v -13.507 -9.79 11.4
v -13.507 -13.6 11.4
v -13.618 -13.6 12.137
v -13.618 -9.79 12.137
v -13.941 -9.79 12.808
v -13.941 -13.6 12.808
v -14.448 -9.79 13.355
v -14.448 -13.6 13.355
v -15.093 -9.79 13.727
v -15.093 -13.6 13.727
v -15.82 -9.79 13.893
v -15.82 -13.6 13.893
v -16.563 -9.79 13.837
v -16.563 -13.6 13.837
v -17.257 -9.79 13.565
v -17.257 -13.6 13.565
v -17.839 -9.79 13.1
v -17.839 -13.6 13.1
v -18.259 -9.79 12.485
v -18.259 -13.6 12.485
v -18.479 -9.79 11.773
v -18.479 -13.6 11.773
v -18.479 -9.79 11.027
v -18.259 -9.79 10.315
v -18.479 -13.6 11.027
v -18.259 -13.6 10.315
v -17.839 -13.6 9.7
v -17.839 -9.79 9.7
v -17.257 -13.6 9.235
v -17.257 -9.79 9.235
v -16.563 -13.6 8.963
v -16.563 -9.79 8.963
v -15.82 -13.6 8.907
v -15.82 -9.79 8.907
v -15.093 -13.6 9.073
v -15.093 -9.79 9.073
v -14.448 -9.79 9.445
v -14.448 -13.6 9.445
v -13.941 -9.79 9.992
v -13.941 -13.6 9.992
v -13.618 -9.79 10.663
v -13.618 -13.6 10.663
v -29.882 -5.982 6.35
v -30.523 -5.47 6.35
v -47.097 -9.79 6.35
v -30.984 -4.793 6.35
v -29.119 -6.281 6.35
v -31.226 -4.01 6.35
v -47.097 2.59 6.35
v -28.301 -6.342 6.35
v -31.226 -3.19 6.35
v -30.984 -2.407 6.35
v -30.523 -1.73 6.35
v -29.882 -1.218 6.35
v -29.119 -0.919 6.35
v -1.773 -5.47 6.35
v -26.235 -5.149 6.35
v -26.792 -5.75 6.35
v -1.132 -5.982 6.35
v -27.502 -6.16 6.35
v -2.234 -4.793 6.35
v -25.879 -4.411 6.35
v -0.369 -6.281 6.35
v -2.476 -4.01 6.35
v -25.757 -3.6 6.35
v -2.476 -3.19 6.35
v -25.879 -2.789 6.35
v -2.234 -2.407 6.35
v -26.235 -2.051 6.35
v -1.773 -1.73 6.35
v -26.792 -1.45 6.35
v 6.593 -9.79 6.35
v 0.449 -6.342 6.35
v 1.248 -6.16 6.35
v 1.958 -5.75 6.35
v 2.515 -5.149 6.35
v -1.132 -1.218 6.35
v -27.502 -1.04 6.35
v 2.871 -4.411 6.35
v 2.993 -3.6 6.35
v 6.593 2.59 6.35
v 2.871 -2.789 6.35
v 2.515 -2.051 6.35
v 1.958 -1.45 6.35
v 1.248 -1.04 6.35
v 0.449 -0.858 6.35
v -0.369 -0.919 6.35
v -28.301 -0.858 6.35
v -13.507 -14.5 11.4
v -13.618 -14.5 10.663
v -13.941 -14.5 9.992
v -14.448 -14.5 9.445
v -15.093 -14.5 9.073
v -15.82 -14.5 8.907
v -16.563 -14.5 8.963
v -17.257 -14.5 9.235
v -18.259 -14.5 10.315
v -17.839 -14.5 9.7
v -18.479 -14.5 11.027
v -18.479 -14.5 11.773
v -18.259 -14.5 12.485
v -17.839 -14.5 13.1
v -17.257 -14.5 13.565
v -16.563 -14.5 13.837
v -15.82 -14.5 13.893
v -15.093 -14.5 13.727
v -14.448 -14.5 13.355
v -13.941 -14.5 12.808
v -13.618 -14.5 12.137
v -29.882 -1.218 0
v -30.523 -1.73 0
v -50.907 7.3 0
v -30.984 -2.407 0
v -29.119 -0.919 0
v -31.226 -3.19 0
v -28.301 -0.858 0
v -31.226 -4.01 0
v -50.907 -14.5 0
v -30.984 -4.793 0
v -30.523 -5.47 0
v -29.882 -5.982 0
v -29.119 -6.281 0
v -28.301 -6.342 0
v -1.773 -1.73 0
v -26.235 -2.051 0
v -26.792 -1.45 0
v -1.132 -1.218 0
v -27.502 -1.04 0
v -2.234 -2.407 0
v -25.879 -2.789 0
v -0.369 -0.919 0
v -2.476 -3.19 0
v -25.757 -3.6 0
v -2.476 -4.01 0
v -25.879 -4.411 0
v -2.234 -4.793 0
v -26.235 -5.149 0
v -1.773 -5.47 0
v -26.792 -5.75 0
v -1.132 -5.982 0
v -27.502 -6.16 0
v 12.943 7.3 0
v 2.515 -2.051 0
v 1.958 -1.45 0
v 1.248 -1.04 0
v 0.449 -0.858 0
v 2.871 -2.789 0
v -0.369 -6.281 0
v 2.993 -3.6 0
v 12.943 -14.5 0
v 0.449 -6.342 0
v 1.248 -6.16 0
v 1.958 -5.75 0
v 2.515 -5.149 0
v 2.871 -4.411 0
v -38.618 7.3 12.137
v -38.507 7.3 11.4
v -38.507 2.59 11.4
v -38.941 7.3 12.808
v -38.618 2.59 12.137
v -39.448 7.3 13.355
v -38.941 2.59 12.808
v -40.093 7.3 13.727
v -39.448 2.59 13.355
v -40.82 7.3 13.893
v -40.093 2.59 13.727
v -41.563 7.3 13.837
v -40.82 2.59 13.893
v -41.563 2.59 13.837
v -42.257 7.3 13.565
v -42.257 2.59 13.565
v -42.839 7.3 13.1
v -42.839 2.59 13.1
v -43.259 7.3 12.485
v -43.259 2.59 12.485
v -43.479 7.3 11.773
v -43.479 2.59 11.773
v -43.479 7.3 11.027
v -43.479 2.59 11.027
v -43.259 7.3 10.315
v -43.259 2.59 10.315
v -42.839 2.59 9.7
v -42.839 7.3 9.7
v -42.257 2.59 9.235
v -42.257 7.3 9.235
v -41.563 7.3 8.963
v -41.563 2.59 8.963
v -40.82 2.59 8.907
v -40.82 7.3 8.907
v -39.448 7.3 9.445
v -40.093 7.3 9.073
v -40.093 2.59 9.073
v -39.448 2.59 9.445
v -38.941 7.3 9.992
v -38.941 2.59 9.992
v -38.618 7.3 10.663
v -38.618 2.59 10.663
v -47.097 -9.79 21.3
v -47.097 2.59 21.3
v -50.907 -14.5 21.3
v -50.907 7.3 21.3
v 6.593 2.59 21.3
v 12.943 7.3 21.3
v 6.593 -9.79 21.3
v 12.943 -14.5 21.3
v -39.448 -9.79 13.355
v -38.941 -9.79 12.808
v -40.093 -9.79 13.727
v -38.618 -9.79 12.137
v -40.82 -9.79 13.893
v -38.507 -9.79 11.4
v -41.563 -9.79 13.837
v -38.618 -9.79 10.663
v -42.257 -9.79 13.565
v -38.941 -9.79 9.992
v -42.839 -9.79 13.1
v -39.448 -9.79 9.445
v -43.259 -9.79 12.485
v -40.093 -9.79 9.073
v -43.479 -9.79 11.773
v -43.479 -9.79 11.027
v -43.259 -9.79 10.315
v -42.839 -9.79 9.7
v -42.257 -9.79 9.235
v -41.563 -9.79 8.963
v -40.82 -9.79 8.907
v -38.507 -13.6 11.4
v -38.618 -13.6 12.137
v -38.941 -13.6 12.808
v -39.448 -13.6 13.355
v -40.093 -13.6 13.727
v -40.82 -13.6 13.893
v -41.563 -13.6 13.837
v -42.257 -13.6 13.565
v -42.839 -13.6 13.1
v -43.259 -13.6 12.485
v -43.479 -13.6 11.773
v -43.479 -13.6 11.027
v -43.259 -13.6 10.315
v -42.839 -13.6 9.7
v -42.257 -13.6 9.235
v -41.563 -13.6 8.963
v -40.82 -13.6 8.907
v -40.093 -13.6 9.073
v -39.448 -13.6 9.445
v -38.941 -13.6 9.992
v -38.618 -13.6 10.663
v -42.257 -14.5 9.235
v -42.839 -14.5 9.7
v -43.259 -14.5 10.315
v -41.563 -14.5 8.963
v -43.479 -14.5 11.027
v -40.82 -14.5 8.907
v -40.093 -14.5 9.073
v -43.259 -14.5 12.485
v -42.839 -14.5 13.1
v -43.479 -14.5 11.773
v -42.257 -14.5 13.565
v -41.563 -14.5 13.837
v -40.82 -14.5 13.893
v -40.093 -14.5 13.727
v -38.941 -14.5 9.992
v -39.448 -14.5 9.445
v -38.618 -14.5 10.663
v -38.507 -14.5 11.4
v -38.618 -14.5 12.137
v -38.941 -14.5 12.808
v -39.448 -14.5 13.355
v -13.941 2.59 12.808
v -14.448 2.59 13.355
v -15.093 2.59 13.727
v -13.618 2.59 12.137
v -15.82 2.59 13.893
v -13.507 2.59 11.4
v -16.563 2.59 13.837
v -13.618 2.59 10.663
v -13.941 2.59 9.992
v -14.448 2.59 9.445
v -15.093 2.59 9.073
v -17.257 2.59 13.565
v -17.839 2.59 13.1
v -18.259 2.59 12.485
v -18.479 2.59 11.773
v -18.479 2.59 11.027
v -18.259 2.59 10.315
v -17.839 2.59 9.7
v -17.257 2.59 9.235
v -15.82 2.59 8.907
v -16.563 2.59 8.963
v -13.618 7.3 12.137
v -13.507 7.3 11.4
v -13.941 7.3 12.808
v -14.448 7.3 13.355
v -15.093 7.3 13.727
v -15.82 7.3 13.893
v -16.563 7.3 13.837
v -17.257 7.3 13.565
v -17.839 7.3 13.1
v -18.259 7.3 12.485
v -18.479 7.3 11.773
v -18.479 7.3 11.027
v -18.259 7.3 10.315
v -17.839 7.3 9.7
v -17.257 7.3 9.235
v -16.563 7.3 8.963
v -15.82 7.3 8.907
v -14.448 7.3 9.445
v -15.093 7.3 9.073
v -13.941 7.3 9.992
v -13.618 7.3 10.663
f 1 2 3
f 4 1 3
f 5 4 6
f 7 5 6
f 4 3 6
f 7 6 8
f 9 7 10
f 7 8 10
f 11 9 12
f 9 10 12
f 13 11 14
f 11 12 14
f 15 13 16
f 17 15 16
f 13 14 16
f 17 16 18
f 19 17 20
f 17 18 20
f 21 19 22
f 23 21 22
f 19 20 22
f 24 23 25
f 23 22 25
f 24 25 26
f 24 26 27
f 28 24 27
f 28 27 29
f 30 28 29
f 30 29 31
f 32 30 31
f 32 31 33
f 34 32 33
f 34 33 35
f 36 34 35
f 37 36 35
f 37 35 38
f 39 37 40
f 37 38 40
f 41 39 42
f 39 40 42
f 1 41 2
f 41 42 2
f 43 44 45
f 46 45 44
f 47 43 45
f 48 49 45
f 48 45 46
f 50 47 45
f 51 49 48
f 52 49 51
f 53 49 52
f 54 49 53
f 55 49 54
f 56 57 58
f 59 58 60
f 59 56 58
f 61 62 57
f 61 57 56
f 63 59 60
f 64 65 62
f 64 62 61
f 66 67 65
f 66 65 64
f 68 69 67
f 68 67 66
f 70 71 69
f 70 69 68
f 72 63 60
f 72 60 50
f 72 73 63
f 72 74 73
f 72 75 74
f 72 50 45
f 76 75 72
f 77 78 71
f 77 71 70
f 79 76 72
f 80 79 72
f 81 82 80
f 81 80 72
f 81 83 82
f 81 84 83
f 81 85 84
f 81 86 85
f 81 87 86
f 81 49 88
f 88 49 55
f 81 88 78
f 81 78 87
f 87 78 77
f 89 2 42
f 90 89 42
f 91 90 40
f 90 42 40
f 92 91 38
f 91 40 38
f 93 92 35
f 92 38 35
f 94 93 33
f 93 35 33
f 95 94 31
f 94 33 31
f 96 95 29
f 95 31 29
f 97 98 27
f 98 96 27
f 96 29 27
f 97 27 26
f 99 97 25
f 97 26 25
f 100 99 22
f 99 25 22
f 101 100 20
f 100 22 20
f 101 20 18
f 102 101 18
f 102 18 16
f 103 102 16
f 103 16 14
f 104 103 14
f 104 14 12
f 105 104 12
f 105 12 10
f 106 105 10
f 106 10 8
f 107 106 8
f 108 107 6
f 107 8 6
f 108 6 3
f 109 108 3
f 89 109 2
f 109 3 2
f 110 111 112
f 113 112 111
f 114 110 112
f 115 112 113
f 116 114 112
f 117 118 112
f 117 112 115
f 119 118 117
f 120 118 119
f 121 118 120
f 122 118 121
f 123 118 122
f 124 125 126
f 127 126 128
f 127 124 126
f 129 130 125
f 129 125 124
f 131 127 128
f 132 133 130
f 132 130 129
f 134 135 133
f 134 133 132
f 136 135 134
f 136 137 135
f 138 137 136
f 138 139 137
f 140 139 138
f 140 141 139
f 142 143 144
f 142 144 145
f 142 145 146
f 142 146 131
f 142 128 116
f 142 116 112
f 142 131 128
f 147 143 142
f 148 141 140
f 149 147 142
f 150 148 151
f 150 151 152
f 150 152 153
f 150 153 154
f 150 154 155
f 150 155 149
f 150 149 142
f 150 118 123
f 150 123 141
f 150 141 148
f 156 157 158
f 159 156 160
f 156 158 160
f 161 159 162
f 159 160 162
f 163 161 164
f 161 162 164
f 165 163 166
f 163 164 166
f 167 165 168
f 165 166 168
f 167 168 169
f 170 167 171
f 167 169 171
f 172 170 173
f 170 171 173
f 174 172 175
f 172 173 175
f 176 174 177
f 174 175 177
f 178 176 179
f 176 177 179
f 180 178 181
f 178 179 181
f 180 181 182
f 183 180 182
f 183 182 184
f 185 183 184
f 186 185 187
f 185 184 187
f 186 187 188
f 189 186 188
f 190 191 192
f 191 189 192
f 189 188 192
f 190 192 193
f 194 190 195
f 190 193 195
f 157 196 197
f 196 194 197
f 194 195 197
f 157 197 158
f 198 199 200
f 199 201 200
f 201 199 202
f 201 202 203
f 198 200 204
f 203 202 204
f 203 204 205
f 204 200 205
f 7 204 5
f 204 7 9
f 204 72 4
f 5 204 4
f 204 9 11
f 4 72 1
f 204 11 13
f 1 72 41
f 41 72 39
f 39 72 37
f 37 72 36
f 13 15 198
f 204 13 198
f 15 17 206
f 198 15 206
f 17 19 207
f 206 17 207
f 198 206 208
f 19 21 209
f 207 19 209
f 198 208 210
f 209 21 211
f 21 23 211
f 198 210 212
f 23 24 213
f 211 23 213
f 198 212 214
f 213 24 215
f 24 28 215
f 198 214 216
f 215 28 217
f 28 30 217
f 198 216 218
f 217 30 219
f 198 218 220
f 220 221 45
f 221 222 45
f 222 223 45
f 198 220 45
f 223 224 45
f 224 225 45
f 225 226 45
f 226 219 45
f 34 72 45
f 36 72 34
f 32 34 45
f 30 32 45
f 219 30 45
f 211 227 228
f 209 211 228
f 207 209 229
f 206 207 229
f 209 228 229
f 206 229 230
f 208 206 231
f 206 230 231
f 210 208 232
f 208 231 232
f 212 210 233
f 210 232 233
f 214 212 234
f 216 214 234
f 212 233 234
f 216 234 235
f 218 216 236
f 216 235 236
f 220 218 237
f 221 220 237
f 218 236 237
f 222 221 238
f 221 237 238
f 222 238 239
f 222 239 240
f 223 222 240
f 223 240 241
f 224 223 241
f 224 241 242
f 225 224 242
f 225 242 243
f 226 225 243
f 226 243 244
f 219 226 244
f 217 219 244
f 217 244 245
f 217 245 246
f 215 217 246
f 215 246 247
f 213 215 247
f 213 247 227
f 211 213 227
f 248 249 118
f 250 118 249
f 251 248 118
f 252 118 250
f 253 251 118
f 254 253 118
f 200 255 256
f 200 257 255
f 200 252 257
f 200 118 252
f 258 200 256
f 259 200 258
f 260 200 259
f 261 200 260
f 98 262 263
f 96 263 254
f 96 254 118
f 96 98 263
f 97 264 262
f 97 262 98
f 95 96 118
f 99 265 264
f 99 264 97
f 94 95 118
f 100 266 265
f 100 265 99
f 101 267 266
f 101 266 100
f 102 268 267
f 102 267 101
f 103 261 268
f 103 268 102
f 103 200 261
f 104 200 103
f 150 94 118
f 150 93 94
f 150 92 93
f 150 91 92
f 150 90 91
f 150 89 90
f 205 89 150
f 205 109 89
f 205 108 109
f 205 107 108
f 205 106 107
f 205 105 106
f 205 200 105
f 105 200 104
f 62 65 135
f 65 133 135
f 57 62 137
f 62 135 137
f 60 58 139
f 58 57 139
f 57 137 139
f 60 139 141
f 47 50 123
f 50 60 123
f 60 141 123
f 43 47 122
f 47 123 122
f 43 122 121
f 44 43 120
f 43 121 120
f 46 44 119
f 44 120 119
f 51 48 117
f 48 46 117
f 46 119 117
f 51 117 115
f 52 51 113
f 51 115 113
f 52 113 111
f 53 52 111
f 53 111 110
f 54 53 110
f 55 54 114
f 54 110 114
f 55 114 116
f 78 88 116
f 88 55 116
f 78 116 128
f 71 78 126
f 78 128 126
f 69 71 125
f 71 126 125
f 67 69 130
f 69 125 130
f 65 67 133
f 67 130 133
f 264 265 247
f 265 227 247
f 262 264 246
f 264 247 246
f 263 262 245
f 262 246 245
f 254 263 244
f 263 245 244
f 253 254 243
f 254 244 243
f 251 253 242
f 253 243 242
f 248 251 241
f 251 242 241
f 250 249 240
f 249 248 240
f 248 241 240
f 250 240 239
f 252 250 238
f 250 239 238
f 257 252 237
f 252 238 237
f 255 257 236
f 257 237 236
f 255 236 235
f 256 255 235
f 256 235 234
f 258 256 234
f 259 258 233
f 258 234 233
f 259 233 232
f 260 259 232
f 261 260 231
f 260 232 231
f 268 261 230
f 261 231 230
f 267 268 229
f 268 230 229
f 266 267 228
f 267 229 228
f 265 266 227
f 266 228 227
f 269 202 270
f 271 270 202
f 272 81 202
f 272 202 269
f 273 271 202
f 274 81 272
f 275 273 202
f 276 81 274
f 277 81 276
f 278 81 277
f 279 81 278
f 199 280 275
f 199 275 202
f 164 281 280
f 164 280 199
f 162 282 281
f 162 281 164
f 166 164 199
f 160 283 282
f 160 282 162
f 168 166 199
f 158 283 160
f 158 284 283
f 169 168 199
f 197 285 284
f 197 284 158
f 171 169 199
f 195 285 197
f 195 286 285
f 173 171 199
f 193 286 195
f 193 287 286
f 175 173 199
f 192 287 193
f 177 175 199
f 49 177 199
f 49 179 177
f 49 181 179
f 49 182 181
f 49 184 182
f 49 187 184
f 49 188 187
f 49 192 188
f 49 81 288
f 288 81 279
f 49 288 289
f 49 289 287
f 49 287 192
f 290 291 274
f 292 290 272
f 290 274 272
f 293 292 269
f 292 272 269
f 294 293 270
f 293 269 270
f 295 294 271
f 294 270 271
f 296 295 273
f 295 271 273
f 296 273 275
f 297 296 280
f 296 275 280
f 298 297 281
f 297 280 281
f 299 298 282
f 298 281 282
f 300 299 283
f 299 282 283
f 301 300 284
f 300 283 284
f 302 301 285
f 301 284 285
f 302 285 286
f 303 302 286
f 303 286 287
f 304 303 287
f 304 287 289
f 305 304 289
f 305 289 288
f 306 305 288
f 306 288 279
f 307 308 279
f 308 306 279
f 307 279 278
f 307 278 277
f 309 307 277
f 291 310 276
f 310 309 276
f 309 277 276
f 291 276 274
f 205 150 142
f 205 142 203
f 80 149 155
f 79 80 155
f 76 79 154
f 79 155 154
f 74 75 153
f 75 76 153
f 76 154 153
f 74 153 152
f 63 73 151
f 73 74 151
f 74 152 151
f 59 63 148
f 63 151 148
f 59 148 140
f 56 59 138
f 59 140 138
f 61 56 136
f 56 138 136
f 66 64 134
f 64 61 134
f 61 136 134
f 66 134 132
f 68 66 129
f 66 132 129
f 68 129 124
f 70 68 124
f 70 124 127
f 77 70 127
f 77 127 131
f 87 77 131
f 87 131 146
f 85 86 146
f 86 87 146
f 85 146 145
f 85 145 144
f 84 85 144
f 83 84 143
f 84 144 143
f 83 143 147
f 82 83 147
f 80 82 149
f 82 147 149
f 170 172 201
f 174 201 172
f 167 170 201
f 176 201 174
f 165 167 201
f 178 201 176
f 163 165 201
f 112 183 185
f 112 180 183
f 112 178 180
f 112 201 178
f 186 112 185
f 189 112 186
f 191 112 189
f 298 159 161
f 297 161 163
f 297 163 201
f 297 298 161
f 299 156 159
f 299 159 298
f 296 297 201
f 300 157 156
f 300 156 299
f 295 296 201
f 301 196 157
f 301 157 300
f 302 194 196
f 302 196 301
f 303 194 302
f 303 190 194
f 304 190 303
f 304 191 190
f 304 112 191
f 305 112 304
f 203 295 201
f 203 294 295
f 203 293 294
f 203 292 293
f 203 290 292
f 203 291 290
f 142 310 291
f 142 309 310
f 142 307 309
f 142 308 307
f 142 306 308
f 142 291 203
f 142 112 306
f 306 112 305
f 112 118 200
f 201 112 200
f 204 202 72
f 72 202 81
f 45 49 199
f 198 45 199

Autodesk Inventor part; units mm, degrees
ref_plane "YZ Plane" through (0, 0, 0) normal (1, 0, 0) x (0, 1, 0)
ref_plane "XZ Plane" through (0, 0, 0) normal (0, 1, 0) x (-1, 0, 0)
sketch "Sketch1" plane through (0, 0, 0) normal (0, 0, 1) x (1, 0, 0)
  line L0 (0, -12.35) -> (-250, -12.35) projected
  line L1 (0, -12.35) -> (0, -7.2) projected
  line L2 (0, -7.2) -> (-250, -7.2) projected
  line L3 (-250, -12.35) -> (-250, -7.2) projected
  line L4 (-250, 5.15) -> (0, 5.15) projected
  line L5 (-250, 0) -> (-250, 5.15) projected
  line L6 (0, 0) -> (-250, 0) projected
  line L7 (0, 0) -> (0, 5.15) projected
  line L8 (0, 6.4) -> (-250, 6.4) projected
  line L9 (-250, -13.6) -> (0, -13.6) projected
  line L10 (-159.051, -15.85) -> (90.949, -15.85) projected
  line L11 (-159.051, -21) -> (-159.051, -15.85) projected
  line L12 (90.949, -21) -> (-159.051, -21) projected
  line L13 (90.949, -21) -> (90.949, -15.85) projected
  line L14 (90.949, 8.65) -> (-159.051, 8.65) projected
  line L15 (90.949, 13.8) -> (90.949, 8.65) projected
  line L16 (-159.051, 13.8) -> (90.949, 13.8) projected
  line L17 (-159.051, 13.8) -> (-159.051, 8.65) projected
  line L18 (-159.051, 7.4) -> (90.949, 7.4) projected
  line L19 (90.949, -14.6) -> (-159.051, -14.6) projected
  line L20 (-159.051, -34.6) -> (90.949, -34.6) projected
  line L21 (90.949, 27.4) -> (-159.051, 27.4) projected
  line L22 (-50.9068, -42.05) -> (-6.1068, -42.05) projected
  line L23 (-6.1068, -42.05) -> (-6.1068, -35.7) projected
  line L24 (-50.9068, -35.7) -> (-6.1068, -35.7) projected
  line L25 (-50.9068, -42.05) -> (-50.9068, -35.7) projected
  line L26 (-50.9068, 28.5) -> (-6.1068, 28.5) projected
  line L27 (-6.1068, 28.5) -> (-6.1068, 34.85) projected
  line L28 (-50.9068, 34.85) -> (-6.1068, 34.85) projected
  line L29 (-50.9068, 28.5) -> (-50.9068, 34.85) projected
  line L30 (-50.9068, -42.05) -> (-50.9068, 34.85) construction
  line L31 (-6.1068, -42.05) -> (-6.1068, 34.85) construction
  line L32 (-50.9068, -13.6) -> (-6.1068, -13.6)
  line L33 (-6.1068, 6.4) -> (-50.9068, 6.4)
  line L34 (-50.9068, 6.4) -> (-50.9068, -13.6)
  line L35 (-6.1068, -13.6) -> (6.5932, -13.6)
  line L36 (6.5932, -13.6) -> (6.5932, 6.4)
  line L37 (6.5932, 6.4) -> (-6.1068, 6.4)
  line L38 (-28.5068, -35.7) -> (-28.5068, 28.5) construction
  line L39 (6.5932, -13.6) -> (-6.1068, 6.4) construction
  circle A0 centre (0.2432, -3.6) radius 2.75
  circle A1 centre (-28.5068, -3.6) radius 2.75
  line L40 (6.5932, 6.4) -> (-50.9068, 6.4)
  line L41 (-50.9068, 6.4) -> (-50.9068, -13.6)
  line L42 (-50.9068, -13.6) -> (6.5932, -13.6)
  line L43 (6.5932, -13.6) -> (6.5932, 6.4)
  dimension "d0" = 12.7
  dimension "d1" = 5.5
extrude "Extrusion1" add sketch "Sketch1" along normal blind 6.35 contours L1 L2 L34 L6 L7 L4 L8 L37 L36 L35 L9 L0 | L0 L34 L2 L1 | L34 L4 L7 L6
sketch "Sketch2" plane through (0, 0, 6.35) normal (0, 0, 1) x (1, 0, 0)
  line L0 (-50.9068, -13.6) -> (6.5932, -13.6) projected
  line L1 (6.5932, -13.6) -> (6.5932, 6.4) projected
  line L2 (-50.9068, -13.6) -> (6.5932, -13.6)
  line L3 (6.5932, -13.6) -> (6.5932, -9.79)
  line L4 (6.5932, -9.79) -> (-50.9068, -9.79)
  line L5 (-50.9068, -9.79) -> (-50.9068, -13.6)
  line L6 (6.5932, 6.4) -> (-50.9068, 6.4) projected
  line L7 (-50.9068, 6.4) -> (6.5932, 6.4)
  line L8 (6.5932, 6.4) -> (6.5932, 2.59)
  line L9 (6.5932, 2.59) -> (-50.9068, 2.59)
  line L10 (-50.9068, 2.59) -> (-50.9068, 6.4)
  point P0 (0, 0)
  dimension "d4" = 3.81
ref_plane "Work Plane1" through (-50.9068, 28.5, 21.3) normal (0, 0, 1) x (1, 0, 0)
extrude "Extrusion2" add sketch "Sketch2" along normal up to surface (14.95 mm away)
sketch "Sketch3" plane through (6.5932, -13.6, 0) normal (1, 0, 0) x (0, 0, -1)
  line L0 (-21.3, 16.19) -> (-21.3, 20) projected
  line L1 (0, 0) -> (-21.3, 0)
  line L2 (-21.3, 0) -> (-21.3, 20)
  line L3 (-21.3, 20) -> (0, 20)
  line L4 (0, 20) -> (0, 0)
  point P0 (0, 13.6)
extrude "Extrusion3" add sketch "Sketch3" along normal blind 6.35
sketch "Sketch5" plane through (-50.9068, -13.6, 0) normal (-1, 0, 0) x (0, 0, 1)
  line L0 (21.3, 0) -> (0, 0) projected
  line L1 (21.3, 20) -> (21.3, 0) projected
  line L2 (0, 0) -> (21.3, 0)
  line L3 (21.3, 0) -> (21.3, 20)
  line L4 (21.3, 20) -> (0, 20)
  line L5 (0, 20) -> (0, 0)
  point P0 (0, 13.6)
extrude "Extrusion4" add sketch "Sketch5" against normal blind 3.81
sketch "Sketch6" plane through (-50.9068, -13.6, 0) normal (0, -1, 0) x (1, 0, 0)
  circle A0 centre (9.9, 11.4) radius 2.5 projected
  circle A1 centre (34.9, 11.4) radius 2.5 projected
  point P0 (50.9068, 0)
extrude "Extrusion5" cut sketch "Sketch6" against normal through all
sketch "Sketch7" plane through (-50.9068, -13.6, 0) normal (0, -1, 0) x (1, 0, 0)
  circle A0 centre (9.9, 11.4) radius 2.5 projected
  circle A1 centre (34.9, 11.4) radius 2.5 projected
  line L0 (0, 0) -> (63.85, 0) projected
  line L1 (63.85, 21.3) -> (63.85, 0) projected
  line L2 (0, 21.3) -> (63.85, 21.3) projected
  line L3 (0, 0) -> (0, 21.3) projected
  point P0 (50.9068, 0)
extrude "Extrusion6" add sketch "Sketch7" along normal blind 0.9
sketch "Sketch8" plane through (-50.9068, 6.4, 21.3) normal (0, 1, 0) x (1, 0, 0)
  circle A0 centre (9.9, 9.9) radius 2.5 projected
  circle A1 centre (34.9, 9.9) radius 2.5 projected
  line L0 (0, 0) -> (63.85, 0) projected
  line L1 (63.85, 21.3) -> (63.85, 0) projected
  line L2 (0, 21.3) -> (63.85, 21.3) projected
  line L3 (0, 21.3) -> (0, 0) projected
  point P0 (50.9068, 21.3)
extrude "Extrusion7" add sketch "Sketch8" along normal blind 0.9
sketch "Sketch9" plane through (-50.9068, 7.3, 21.3) normal (0, 1, 0) x (1, 0, 0)
  point P0 (50.9068, 21.3)
properties part number "rollerHolderInnerZ"
